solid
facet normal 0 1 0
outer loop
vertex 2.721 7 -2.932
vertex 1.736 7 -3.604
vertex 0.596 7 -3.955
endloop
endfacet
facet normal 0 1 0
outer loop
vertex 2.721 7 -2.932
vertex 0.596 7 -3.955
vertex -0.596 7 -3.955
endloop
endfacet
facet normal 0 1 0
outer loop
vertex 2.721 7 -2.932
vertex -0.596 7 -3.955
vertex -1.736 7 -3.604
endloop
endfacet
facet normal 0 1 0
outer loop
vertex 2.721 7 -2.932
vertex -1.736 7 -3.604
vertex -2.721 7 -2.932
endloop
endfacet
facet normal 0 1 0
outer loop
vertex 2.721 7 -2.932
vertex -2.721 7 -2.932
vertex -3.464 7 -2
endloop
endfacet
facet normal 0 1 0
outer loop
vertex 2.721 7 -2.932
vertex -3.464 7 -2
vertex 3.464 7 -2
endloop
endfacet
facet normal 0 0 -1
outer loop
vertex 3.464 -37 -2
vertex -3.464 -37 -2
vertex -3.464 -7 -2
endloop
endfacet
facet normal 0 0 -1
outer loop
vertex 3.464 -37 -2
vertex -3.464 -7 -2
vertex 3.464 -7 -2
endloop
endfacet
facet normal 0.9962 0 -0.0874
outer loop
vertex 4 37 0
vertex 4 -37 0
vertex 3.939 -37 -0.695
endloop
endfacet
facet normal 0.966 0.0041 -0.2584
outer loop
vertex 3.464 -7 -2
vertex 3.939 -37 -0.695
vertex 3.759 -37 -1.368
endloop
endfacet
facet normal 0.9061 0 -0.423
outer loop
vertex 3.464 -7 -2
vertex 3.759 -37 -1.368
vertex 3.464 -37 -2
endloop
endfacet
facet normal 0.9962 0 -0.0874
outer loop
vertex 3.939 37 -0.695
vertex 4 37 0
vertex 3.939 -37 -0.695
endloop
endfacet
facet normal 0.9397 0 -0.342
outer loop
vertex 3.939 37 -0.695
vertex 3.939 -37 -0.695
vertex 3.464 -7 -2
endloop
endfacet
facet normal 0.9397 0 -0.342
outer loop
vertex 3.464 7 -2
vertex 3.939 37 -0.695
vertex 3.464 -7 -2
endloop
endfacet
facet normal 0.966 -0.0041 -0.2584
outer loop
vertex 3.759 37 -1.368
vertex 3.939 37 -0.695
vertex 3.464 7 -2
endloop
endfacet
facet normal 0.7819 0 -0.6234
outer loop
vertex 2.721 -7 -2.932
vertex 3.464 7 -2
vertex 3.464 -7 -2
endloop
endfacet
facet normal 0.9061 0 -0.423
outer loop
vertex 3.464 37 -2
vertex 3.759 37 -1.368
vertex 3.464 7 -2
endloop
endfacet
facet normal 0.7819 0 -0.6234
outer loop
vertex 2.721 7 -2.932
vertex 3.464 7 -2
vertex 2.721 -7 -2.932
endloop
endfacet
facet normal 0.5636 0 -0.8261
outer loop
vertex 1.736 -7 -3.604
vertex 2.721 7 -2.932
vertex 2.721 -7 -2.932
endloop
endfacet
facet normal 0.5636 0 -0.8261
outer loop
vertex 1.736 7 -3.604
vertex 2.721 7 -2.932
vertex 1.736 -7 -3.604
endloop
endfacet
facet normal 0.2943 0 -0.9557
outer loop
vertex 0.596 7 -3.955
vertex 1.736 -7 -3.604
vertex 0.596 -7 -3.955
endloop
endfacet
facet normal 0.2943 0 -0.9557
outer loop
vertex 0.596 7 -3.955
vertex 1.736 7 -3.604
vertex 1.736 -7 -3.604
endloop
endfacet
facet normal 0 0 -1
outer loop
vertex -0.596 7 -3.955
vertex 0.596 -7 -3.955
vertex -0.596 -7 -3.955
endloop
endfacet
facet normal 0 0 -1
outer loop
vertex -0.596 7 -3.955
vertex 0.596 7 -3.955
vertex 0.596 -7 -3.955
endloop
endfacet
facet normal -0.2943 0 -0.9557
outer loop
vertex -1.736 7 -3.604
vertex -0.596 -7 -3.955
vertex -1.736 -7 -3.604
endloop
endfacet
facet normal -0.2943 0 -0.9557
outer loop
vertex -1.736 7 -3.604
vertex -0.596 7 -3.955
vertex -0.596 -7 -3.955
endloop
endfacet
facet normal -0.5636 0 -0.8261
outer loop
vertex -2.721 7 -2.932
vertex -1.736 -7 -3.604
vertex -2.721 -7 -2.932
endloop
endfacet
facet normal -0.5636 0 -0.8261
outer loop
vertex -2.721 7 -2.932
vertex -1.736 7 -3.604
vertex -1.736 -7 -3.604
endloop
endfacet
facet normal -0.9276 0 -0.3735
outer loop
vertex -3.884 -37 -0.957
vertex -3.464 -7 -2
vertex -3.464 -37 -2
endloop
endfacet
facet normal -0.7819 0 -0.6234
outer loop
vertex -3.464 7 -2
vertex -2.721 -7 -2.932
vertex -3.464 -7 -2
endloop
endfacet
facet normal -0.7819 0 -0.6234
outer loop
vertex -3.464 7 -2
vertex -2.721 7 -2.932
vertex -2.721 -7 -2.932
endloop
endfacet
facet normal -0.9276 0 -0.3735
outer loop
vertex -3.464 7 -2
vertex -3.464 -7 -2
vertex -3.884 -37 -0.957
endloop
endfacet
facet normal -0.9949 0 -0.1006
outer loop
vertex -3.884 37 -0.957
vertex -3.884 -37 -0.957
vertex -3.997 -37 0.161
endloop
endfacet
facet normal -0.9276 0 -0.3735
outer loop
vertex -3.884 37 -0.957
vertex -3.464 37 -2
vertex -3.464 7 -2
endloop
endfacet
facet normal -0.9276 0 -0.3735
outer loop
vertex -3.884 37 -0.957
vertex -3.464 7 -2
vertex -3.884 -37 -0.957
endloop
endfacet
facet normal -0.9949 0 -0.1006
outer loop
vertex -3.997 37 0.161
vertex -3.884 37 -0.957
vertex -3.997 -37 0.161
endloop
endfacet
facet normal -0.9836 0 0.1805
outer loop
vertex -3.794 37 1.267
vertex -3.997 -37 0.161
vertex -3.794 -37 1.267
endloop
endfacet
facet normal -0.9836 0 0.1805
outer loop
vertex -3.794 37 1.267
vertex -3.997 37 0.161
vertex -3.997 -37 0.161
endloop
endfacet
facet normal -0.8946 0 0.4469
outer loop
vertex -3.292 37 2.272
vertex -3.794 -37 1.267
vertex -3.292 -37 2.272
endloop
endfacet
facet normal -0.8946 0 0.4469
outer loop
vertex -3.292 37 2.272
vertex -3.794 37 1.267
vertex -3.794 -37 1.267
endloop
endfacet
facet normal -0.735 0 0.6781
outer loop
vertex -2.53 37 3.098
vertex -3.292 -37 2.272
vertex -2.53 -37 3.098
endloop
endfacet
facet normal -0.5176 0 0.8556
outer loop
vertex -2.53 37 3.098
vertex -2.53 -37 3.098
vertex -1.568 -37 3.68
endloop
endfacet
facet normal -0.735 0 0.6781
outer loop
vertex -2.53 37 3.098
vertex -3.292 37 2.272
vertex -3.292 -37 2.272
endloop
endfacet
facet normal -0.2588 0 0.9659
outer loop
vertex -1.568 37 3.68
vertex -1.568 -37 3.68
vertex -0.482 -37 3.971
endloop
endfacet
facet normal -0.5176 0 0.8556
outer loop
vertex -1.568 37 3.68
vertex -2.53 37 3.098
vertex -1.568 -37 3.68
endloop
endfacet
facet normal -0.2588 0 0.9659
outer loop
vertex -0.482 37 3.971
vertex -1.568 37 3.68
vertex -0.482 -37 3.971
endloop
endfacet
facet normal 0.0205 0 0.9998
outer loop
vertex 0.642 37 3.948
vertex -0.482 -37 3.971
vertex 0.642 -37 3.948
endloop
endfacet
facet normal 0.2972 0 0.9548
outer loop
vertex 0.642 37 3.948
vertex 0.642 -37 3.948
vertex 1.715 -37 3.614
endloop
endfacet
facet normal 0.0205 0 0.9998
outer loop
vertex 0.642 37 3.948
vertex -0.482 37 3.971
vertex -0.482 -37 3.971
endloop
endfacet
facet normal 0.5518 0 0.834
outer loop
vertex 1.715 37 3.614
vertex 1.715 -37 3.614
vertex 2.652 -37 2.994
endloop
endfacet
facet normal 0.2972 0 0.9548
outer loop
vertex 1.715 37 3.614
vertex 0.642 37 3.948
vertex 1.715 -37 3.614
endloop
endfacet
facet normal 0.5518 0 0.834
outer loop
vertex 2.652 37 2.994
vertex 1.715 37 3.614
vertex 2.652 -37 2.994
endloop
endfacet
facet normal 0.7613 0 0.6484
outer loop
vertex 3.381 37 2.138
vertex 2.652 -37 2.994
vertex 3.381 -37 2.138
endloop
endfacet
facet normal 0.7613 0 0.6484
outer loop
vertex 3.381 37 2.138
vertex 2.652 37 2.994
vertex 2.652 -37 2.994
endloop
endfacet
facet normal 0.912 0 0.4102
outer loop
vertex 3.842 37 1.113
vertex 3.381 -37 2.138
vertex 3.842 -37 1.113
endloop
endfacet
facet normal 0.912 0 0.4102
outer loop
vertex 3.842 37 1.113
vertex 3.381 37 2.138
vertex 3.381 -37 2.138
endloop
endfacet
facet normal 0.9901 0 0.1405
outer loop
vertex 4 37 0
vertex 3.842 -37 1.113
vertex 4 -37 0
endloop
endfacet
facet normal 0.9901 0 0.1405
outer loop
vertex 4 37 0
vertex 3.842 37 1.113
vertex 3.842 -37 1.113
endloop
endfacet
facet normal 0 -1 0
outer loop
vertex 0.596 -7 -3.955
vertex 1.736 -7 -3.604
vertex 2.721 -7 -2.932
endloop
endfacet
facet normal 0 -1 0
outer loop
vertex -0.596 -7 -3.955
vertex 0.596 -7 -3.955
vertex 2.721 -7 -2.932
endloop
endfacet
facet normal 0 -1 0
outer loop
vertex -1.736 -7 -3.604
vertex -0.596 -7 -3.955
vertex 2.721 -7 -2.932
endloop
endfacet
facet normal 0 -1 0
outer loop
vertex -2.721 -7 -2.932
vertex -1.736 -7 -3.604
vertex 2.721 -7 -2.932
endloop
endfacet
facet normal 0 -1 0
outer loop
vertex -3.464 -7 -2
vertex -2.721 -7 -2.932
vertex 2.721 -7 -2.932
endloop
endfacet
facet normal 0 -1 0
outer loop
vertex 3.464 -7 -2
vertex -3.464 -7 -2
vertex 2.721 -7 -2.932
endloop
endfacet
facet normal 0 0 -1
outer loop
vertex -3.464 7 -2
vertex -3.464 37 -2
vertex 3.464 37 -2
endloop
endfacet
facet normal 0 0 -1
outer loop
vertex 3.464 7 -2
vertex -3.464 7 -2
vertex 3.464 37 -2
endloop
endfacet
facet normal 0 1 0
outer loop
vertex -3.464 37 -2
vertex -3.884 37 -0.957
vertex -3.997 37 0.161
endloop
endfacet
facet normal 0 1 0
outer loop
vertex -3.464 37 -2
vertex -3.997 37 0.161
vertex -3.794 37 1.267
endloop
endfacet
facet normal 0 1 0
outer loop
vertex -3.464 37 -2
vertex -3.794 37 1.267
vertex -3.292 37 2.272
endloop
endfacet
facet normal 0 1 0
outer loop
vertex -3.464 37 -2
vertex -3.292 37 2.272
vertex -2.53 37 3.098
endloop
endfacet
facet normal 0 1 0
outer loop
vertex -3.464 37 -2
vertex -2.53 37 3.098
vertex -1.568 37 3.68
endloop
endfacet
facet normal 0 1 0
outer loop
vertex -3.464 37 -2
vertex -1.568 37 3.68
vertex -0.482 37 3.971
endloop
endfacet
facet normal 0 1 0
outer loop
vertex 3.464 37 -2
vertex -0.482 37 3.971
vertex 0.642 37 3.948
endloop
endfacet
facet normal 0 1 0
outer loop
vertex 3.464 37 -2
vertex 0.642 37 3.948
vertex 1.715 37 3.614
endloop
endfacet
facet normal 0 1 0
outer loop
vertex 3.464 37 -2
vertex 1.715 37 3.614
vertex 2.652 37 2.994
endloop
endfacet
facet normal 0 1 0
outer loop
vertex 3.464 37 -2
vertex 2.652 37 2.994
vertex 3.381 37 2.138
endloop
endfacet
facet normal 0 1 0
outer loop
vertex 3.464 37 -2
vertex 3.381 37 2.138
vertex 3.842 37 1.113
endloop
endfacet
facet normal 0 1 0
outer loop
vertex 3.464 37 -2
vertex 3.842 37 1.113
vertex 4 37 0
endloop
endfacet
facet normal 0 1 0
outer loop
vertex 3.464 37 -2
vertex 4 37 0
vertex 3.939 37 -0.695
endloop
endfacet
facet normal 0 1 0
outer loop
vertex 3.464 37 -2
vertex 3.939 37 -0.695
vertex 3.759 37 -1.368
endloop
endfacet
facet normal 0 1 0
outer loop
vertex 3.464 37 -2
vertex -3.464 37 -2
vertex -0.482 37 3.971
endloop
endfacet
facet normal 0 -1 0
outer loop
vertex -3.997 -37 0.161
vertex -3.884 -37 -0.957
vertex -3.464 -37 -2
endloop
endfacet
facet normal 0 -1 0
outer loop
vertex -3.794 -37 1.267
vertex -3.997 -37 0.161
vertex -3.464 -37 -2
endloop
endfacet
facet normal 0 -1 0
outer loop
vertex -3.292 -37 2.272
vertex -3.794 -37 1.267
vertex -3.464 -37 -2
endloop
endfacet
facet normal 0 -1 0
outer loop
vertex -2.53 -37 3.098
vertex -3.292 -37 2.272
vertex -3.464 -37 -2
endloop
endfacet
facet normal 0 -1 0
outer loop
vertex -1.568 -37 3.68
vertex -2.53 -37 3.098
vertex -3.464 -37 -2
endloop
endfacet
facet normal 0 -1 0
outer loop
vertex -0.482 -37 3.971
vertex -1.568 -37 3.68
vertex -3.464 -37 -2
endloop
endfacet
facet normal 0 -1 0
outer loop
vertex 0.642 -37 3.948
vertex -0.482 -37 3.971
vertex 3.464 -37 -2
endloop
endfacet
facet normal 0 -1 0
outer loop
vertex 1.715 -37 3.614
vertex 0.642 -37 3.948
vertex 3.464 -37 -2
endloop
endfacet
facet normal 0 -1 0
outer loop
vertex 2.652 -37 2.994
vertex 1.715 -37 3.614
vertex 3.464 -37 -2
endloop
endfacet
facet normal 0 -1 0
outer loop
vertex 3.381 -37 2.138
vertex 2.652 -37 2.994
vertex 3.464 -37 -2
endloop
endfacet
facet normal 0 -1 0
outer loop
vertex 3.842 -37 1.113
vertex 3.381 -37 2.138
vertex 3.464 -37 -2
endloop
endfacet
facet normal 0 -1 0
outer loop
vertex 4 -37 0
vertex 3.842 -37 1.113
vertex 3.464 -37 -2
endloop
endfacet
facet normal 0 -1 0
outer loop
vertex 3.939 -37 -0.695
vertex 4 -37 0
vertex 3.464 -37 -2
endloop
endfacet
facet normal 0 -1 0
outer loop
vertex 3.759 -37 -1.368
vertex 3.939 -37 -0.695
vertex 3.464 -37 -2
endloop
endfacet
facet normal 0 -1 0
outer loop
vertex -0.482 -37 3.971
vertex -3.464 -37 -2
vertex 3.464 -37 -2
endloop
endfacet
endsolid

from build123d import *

# Parameters (mm, degrees)
BOSS_EXTRUDE1_DEPTH      = 37
BOSS_EXTRUDE1_DEPTH_BACK = 37
SKETCH1_R                = 4
CUT_EXTRUDE1_DEPTH       = 30


with BuildPart() as part:
    # Sketch1 → Boss-Extrude1 (new, two sides: drawn at the far end of the back side and taken through both)
    with BuildSketch(Plane(origin=(0, 0, 0), x_dir=(1, 0, 0), z_dir=(0, 1, 0)).offset(-BOSS_EXTRUDE1_DEPTH_BACK)):
        Circle(SKETCH1_R)
    extrude(amount=BOSS_EXTRUDE1_DEPTH + BOSS_EXTRUDE1_DEPTH_BACK)

    # Sketch2 → Cut-Extrude1 (cut)
    with BuildSketch(Plane(origin=(0, 37, 0), x_dir=(1, 0, 0), z_dir=(0, 1, 0))):
        with BuildLine():
            ThreePointArc((3.464101615, 2), (0, 4), (-3.464101615, 2))
            Line((-3.464101615, 2), (3.464101615, 2))
        make_face()
    cut_extrude1 = extrude(amount=-CUT_EXTRUDE1_DEPTH, mode=Mode.SUBTRACT)

    # Mirror1: Cut-Extrude1 across plane
    add(cut_extrude1.mirror(Plane.ZX), mode=Mode.SUBTRACT)


solid = part.part
